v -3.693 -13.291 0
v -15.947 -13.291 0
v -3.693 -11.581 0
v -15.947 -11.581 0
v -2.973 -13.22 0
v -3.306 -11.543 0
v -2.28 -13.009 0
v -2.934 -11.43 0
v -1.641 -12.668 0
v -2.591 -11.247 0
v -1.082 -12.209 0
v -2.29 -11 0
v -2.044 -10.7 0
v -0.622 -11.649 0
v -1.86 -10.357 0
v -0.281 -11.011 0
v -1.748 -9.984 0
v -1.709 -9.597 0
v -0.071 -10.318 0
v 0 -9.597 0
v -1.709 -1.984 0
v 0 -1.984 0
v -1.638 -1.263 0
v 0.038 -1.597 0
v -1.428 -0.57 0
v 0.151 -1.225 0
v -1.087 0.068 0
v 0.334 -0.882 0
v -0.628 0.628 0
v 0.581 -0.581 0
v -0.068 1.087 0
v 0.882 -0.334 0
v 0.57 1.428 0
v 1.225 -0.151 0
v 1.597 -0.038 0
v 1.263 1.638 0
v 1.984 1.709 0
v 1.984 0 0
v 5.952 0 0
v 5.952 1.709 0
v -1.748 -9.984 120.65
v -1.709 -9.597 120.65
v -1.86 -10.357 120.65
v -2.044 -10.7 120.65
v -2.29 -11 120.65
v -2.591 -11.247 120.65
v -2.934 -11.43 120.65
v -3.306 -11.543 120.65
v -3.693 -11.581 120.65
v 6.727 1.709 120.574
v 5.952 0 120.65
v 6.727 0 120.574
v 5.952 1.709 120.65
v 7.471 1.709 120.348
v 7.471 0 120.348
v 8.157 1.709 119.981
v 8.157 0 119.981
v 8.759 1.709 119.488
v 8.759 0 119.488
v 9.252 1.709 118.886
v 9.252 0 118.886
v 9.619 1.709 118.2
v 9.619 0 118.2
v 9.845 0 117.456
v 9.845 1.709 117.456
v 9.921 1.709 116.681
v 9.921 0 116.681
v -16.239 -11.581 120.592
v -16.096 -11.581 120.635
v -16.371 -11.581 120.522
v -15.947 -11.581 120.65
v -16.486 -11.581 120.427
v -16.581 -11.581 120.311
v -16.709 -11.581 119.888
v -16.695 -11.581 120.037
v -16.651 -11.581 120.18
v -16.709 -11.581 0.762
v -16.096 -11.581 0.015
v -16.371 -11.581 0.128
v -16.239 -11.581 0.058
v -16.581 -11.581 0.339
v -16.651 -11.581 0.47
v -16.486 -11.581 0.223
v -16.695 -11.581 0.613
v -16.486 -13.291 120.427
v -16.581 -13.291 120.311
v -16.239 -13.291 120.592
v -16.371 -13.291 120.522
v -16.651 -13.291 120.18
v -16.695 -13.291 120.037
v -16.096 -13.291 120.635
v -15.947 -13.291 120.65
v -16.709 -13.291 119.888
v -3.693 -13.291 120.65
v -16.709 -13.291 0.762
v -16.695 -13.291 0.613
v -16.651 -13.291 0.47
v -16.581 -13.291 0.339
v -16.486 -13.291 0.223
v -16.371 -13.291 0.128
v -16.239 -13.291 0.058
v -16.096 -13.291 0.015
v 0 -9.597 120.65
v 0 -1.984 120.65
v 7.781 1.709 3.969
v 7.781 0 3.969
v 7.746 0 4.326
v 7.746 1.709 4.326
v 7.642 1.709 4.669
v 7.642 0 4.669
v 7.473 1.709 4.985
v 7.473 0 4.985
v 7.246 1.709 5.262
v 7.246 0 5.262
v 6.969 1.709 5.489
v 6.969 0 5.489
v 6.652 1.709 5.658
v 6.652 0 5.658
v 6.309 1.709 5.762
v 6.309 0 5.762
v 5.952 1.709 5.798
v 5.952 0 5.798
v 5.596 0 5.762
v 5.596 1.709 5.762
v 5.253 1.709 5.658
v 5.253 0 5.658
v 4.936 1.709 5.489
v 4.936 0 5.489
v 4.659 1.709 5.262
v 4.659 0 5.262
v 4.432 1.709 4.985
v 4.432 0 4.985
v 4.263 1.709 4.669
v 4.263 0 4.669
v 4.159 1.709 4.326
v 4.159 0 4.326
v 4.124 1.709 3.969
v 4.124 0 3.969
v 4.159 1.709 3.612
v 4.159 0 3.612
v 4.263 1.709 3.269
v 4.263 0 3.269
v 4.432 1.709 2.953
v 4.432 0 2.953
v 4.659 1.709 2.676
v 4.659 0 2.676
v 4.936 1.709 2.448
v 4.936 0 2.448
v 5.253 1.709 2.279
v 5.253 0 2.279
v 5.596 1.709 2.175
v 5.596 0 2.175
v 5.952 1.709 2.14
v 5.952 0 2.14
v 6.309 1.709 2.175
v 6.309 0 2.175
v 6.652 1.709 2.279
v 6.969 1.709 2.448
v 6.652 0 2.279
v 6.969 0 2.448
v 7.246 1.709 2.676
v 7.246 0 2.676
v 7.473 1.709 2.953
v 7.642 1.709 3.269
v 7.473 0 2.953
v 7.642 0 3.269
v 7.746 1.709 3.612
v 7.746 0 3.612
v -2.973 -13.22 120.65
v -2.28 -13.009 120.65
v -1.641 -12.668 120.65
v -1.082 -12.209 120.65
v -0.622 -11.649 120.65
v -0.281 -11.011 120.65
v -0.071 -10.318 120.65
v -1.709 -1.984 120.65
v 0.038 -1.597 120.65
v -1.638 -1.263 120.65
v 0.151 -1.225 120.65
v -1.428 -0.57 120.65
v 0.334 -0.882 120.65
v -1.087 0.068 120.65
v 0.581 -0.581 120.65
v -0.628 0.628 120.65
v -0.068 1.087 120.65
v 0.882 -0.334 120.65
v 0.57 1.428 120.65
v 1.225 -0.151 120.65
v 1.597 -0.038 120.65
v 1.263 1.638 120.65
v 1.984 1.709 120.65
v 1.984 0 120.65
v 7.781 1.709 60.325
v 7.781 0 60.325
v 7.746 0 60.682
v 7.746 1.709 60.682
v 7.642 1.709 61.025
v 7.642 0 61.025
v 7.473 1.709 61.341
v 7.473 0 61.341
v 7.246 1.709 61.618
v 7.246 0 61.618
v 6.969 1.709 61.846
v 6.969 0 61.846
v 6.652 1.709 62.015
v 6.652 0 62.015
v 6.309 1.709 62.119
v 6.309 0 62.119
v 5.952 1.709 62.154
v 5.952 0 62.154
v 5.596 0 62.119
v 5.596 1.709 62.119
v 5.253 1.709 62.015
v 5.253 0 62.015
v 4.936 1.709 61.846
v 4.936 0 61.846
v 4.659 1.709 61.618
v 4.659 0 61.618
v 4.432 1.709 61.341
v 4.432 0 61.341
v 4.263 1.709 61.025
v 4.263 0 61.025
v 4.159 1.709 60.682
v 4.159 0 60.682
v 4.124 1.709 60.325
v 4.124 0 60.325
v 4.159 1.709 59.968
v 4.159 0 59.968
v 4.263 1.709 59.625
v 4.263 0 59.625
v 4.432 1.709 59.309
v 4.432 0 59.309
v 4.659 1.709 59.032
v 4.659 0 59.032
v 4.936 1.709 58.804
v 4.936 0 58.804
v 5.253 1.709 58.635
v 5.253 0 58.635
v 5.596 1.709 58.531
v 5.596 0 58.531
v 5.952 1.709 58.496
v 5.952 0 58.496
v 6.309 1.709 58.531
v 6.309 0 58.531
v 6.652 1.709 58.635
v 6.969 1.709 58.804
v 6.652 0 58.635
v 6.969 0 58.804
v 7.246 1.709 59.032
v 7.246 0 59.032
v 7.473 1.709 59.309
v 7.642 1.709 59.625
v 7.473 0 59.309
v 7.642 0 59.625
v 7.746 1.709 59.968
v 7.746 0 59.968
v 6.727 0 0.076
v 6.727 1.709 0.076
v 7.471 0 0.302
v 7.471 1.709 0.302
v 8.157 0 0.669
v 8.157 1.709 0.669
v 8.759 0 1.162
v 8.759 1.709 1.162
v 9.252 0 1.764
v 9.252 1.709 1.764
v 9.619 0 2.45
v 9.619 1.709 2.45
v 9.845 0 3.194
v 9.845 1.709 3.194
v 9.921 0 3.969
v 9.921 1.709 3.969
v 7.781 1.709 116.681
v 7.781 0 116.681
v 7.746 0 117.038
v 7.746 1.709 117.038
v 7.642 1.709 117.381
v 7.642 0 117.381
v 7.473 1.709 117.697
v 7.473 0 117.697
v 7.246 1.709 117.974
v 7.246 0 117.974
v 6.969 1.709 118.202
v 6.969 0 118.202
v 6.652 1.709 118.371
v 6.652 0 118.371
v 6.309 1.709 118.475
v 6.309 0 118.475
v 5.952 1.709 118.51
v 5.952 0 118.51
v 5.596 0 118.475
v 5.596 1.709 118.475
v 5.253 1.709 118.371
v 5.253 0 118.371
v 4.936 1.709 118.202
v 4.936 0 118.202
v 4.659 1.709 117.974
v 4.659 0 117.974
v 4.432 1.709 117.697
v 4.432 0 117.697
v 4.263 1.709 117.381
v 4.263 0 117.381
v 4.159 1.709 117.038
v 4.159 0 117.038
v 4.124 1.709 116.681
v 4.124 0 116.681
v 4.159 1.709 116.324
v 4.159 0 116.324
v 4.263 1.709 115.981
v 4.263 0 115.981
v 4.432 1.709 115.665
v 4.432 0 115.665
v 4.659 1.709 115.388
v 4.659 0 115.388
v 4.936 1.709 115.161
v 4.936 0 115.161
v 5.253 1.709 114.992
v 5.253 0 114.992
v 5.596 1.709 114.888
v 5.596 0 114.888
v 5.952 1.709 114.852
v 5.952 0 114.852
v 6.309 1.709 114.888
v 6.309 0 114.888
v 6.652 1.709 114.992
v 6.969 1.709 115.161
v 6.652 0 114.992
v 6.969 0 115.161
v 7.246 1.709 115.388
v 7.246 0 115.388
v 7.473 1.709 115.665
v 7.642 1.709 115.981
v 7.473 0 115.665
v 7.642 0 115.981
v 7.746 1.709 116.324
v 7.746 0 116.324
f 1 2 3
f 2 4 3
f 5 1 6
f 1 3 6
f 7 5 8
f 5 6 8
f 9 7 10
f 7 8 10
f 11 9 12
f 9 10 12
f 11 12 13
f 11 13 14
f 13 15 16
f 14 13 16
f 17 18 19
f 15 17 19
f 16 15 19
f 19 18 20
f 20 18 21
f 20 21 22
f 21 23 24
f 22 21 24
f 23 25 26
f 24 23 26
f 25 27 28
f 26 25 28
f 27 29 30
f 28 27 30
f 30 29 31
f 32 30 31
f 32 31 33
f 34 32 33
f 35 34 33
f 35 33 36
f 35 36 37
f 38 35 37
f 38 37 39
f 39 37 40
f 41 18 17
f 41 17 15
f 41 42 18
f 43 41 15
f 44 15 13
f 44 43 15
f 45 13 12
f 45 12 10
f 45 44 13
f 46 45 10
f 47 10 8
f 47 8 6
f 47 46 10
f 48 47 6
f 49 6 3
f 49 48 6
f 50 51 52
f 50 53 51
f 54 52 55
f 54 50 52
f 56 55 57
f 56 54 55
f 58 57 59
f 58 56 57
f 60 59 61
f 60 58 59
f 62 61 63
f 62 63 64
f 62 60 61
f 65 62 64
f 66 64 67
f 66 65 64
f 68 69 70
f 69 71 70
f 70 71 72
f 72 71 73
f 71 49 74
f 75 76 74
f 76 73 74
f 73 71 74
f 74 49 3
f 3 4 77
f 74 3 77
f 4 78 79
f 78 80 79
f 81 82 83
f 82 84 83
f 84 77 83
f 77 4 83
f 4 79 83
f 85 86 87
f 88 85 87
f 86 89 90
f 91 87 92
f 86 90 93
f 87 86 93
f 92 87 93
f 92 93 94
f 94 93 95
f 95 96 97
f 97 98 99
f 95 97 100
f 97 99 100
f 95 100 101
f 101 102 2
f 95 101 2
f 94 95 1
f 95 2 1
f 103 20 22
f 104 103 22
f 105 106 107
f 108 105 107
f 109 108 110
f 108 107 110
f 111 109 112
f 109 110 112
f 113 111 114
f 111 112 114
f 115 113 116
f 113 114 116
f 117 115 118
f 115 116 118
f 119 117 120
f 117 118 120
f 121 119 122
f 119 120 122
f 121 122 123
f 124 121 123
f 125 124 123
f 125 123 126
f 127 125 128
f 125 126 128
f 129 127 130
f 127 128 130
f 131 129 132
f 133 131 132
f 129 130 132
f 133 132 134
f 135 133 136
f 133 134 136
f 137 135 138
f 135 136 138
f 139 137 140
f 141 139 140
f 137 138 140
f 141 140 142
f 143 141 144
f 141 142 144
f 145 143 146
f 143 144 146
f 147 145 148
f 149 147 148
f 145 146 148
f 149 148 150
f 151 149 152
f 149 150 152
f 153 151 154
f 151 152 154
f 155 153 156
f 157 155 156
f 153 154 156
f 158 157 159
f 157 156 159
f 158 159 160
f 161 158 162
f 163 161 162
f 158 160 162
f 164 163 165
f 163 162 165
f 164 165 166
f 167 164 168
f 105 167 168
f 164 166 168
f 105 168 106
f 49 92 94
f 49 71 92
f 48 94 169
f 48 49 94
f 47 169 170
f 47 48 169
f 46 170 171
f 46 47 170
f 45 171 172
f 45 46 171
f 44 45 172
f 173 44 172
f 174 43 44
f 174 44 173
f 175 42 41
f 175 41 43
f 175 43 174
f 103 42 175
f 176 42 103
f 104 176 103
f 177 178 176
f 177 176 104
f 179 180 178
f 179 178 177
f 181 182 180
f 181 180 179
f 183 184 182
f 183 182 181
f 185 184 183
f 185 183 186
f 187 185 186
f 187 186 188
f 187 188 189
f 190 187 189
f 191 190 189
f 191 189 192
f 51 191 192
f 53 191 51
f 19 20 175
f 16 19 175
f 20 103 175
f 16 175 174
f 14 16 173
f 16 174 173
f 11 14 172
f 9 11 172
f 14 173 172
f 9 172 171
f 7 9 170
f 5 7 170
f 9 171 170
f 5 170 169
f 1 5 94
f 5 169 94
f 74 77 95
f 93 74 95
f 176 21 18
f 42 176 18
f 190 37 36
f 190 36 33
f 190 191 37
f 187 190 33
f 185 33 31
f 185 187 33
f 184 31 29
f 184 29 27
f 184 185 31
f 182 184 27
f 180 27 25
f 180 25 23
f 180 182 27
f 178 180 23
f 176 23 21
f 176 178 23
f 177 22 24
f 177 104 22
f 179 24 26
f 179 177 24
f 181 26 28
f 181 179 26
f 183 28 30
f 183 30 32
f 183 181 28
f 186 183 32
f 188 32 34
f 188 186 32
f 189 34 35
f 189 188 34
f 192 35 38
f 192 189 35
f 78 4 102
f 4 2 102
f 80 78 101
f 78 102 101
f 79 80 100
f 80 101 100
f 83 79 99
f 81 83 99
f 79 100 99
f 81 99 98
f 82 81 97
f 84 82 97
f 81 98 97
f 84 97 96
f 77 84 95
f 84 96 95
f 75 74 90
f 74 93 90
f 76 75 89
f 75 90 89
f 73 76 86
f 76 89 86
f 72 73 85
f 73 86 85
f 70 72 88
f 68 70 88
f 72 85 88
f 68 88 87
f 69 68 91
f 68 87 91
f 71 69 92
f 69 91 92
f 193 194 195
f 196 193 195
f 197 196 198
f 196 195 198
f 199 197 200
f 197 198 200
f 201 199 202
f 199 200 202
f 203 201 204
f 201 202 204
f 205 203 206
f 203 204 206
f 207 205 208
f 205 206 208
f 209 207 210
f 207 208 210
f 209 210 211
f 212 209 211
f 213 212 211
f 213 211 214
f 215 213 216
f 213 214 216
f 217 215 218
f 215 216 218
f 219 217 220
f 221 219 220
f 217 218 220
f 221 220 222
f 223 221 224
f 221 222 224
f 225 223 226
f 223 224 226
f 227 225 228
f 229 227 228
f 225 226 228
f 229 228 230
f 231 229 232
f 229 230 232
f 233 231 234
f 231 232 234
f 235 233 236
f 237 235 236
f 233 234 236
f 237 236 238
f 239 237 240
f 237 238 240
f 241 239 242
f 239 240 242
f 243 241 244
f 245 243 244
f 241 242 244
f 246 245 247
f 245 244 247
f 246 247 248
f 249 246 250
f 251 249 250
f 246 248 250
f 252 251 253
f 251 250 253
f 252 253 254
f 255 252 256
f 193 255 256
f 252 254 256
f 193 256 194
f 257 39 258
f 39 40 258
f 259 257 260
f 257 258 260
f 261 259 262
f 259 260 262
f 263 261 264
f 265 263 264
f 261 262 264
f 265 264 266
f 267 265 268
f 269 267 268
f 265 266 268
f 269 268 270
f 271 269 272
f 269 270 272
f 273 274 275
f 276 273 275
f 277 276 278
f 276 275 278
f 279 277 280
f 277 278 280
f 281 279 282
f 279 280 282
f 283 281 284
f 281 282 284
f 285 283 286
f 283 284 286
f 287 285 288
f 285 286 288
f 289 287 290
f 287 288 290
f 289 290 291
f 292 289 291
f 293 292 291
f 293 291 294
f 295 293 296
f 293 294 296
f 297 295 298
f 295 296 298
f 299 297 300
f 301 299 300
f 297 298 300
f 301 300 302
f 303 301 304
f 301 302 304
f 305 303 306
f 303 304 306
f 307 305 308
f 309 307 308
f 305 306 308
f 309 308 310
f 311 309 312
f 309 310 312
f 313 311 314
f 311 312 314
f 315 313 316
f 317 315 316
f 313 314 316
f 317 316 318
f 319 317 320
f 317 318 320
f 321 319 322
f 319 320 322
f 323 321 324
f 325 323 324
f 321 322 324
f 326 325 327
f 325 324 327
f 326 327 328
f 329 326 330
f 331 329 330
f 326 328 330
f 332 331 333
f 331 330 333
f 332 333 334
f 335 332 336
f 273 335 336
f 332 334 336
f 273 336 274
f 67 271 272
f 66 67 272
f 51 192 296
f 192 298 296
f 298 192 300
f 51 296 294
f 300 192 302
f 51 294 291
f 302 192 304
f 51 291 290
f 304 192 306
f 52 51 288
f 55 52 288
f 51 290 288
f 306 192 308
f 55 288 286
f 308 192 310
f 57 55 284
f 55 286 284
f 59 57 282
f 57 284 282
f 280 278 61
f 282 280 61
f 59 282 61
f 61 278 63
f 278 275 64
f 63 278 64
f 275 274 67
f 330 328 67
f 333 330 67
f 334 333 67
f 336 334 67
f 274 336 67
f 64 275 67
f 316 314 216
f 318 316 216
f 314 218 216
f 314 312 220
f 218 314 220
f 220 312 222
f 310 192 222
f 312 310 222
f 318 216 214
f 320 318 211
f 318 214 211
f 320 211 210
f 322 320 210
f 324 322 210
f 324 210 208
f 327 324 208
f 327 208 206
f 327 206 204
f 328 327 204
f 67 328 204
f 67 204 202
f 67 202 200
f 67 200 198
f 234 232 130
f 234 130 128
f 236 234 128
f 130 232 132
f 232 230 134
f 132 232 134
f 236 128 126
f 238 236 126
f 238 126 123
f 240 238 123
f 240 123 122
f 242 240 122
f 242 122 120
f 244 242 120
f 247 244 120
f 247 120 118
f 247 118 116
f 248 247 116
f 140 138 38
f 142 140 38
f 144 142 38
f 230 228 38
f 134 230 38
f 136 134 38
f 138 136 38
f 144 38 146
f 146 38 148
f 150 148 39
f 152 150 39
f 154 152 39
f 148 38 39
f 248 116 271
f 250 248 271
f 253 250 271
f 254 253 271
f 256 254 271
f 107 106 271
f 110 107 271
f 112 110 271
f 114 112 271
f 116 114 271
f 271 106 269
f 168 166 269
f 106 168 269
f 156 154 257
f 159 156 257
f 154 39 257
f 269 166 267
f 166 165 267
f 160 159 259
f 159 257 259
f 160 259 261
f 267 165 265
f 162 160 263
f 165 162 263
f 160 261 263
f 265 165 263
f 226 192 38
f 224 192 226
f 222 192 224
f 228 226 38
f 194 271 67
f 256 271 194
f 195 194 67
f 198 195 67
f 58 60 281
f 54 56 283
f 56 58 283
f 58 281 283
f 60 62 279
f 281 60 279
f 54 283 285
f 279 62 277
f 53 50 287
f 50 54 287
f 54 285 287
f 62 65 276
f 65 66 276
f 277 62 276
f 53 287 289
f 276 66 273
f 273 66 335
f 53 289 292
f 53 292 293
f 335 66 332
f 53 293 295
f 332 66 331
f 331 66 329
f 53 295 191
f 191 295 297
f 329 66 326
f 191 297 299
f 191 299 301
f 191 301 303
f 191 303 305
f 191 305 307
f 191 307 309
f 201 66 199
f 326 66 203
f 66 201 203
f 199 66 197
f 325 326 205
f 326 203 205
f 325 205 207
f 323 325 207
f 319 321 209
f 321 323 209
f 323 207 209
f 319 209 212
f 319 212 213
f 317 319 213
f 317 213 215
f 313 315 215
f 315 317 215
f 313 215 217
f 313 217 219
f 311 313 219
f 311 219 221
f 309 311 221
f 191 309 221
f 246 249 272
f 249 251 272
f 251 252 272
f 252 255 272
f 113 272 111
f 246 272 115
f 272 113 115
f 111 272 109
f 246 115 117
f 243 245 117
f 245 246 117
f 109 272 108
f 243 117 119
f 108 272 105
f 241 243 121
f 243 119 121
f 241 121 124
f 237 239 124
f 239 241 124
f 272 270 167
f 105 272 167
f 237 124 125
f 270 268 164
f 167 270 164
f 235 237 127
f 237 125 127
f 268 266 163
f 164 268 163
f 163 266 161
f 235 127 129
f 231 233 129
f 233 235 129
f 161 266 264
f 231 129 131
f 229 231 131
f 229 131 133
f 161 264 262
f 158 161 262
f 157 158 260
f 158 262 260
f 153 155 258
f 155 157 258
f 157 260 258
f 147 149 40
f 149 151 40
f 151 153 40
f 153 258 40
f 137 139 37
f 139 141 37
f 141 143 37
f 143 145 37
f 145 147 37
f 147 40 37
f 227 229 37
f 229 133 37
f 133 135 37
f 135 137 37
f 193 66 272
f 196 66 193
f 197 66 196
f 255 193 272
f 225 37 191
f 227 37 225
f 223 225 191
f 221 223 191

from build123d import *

# Parameters (mm, degrees)
F1_DEPTH = 120.65
F2_R     = 1.98374
F3_R     = 3.69316
F4_R     = 3.96875
F5_R     = 0.762
F6_R     = 1.8288
F7_DEPTH = 1.70942


with BuildPart() as f1:
    # F0 (on Top) → F1 (new body)
    with BuildSketch(Plane.XY):
        Polygon((0, -13.29058), (0, 0), (9.92124, 0), (9.92124, 1.70942), (-1.70942, 1.70942), (-1.70942, -11.58116), (-16.70942, -11.58116), (-16.70942, -13.29058), align=None)
    extrude(amount=F1_DEPTH)

    # F2
    f2_edges = [f1.edges().sort_by_distance(p)[0] for p in [
        (0, 0, 60.325),
        (-1.70942, -11.58116, 60.325),
    ]]
    fillet(f2_edges, radius=F2_R)

    # F3
    f3_edges = [f1.edges().sort_by_distance(p)[0] for p in [
        (0, -13.29058, 60.325),
        (-1.70942, 1.70942, 60.325),
    ]]
    fillet(f3_edges, radius=F3_R)

    # F4
    f4_edges = [f1.edges().sort_by_distance(p)[0] for p in [
        (9.92124, 0.85471, 120.65),
        (9.92124, 0.85471, 0),
    ]]
    fillet(f4_edges, radius=F4_R)

    # F5
    f5_edges = [f1.edges().sort_by_distance(p)[0] for p in [
        (-16.70942, -12.43587, 0),
        (-16.70942, -12.43587, 120.65),
    ]]
    fillet(f5_edges, radius=F5_R)

    # F6 (on face) → F7 (cut, through all)
    with BuildSketch(Plane.XZ):
        with Locations((5.95249, 116.68125)):
            Circle(F6_R)
        with Locations((5.95249, 3.96875)):
            Circle(F6_R)
        with Locations((5.95249, 60.325)):
            Circle(F6_R)
    extrude(amount=-F7_DEPTH, mode=Mode.SUBTRACT)


solid = f1.part
